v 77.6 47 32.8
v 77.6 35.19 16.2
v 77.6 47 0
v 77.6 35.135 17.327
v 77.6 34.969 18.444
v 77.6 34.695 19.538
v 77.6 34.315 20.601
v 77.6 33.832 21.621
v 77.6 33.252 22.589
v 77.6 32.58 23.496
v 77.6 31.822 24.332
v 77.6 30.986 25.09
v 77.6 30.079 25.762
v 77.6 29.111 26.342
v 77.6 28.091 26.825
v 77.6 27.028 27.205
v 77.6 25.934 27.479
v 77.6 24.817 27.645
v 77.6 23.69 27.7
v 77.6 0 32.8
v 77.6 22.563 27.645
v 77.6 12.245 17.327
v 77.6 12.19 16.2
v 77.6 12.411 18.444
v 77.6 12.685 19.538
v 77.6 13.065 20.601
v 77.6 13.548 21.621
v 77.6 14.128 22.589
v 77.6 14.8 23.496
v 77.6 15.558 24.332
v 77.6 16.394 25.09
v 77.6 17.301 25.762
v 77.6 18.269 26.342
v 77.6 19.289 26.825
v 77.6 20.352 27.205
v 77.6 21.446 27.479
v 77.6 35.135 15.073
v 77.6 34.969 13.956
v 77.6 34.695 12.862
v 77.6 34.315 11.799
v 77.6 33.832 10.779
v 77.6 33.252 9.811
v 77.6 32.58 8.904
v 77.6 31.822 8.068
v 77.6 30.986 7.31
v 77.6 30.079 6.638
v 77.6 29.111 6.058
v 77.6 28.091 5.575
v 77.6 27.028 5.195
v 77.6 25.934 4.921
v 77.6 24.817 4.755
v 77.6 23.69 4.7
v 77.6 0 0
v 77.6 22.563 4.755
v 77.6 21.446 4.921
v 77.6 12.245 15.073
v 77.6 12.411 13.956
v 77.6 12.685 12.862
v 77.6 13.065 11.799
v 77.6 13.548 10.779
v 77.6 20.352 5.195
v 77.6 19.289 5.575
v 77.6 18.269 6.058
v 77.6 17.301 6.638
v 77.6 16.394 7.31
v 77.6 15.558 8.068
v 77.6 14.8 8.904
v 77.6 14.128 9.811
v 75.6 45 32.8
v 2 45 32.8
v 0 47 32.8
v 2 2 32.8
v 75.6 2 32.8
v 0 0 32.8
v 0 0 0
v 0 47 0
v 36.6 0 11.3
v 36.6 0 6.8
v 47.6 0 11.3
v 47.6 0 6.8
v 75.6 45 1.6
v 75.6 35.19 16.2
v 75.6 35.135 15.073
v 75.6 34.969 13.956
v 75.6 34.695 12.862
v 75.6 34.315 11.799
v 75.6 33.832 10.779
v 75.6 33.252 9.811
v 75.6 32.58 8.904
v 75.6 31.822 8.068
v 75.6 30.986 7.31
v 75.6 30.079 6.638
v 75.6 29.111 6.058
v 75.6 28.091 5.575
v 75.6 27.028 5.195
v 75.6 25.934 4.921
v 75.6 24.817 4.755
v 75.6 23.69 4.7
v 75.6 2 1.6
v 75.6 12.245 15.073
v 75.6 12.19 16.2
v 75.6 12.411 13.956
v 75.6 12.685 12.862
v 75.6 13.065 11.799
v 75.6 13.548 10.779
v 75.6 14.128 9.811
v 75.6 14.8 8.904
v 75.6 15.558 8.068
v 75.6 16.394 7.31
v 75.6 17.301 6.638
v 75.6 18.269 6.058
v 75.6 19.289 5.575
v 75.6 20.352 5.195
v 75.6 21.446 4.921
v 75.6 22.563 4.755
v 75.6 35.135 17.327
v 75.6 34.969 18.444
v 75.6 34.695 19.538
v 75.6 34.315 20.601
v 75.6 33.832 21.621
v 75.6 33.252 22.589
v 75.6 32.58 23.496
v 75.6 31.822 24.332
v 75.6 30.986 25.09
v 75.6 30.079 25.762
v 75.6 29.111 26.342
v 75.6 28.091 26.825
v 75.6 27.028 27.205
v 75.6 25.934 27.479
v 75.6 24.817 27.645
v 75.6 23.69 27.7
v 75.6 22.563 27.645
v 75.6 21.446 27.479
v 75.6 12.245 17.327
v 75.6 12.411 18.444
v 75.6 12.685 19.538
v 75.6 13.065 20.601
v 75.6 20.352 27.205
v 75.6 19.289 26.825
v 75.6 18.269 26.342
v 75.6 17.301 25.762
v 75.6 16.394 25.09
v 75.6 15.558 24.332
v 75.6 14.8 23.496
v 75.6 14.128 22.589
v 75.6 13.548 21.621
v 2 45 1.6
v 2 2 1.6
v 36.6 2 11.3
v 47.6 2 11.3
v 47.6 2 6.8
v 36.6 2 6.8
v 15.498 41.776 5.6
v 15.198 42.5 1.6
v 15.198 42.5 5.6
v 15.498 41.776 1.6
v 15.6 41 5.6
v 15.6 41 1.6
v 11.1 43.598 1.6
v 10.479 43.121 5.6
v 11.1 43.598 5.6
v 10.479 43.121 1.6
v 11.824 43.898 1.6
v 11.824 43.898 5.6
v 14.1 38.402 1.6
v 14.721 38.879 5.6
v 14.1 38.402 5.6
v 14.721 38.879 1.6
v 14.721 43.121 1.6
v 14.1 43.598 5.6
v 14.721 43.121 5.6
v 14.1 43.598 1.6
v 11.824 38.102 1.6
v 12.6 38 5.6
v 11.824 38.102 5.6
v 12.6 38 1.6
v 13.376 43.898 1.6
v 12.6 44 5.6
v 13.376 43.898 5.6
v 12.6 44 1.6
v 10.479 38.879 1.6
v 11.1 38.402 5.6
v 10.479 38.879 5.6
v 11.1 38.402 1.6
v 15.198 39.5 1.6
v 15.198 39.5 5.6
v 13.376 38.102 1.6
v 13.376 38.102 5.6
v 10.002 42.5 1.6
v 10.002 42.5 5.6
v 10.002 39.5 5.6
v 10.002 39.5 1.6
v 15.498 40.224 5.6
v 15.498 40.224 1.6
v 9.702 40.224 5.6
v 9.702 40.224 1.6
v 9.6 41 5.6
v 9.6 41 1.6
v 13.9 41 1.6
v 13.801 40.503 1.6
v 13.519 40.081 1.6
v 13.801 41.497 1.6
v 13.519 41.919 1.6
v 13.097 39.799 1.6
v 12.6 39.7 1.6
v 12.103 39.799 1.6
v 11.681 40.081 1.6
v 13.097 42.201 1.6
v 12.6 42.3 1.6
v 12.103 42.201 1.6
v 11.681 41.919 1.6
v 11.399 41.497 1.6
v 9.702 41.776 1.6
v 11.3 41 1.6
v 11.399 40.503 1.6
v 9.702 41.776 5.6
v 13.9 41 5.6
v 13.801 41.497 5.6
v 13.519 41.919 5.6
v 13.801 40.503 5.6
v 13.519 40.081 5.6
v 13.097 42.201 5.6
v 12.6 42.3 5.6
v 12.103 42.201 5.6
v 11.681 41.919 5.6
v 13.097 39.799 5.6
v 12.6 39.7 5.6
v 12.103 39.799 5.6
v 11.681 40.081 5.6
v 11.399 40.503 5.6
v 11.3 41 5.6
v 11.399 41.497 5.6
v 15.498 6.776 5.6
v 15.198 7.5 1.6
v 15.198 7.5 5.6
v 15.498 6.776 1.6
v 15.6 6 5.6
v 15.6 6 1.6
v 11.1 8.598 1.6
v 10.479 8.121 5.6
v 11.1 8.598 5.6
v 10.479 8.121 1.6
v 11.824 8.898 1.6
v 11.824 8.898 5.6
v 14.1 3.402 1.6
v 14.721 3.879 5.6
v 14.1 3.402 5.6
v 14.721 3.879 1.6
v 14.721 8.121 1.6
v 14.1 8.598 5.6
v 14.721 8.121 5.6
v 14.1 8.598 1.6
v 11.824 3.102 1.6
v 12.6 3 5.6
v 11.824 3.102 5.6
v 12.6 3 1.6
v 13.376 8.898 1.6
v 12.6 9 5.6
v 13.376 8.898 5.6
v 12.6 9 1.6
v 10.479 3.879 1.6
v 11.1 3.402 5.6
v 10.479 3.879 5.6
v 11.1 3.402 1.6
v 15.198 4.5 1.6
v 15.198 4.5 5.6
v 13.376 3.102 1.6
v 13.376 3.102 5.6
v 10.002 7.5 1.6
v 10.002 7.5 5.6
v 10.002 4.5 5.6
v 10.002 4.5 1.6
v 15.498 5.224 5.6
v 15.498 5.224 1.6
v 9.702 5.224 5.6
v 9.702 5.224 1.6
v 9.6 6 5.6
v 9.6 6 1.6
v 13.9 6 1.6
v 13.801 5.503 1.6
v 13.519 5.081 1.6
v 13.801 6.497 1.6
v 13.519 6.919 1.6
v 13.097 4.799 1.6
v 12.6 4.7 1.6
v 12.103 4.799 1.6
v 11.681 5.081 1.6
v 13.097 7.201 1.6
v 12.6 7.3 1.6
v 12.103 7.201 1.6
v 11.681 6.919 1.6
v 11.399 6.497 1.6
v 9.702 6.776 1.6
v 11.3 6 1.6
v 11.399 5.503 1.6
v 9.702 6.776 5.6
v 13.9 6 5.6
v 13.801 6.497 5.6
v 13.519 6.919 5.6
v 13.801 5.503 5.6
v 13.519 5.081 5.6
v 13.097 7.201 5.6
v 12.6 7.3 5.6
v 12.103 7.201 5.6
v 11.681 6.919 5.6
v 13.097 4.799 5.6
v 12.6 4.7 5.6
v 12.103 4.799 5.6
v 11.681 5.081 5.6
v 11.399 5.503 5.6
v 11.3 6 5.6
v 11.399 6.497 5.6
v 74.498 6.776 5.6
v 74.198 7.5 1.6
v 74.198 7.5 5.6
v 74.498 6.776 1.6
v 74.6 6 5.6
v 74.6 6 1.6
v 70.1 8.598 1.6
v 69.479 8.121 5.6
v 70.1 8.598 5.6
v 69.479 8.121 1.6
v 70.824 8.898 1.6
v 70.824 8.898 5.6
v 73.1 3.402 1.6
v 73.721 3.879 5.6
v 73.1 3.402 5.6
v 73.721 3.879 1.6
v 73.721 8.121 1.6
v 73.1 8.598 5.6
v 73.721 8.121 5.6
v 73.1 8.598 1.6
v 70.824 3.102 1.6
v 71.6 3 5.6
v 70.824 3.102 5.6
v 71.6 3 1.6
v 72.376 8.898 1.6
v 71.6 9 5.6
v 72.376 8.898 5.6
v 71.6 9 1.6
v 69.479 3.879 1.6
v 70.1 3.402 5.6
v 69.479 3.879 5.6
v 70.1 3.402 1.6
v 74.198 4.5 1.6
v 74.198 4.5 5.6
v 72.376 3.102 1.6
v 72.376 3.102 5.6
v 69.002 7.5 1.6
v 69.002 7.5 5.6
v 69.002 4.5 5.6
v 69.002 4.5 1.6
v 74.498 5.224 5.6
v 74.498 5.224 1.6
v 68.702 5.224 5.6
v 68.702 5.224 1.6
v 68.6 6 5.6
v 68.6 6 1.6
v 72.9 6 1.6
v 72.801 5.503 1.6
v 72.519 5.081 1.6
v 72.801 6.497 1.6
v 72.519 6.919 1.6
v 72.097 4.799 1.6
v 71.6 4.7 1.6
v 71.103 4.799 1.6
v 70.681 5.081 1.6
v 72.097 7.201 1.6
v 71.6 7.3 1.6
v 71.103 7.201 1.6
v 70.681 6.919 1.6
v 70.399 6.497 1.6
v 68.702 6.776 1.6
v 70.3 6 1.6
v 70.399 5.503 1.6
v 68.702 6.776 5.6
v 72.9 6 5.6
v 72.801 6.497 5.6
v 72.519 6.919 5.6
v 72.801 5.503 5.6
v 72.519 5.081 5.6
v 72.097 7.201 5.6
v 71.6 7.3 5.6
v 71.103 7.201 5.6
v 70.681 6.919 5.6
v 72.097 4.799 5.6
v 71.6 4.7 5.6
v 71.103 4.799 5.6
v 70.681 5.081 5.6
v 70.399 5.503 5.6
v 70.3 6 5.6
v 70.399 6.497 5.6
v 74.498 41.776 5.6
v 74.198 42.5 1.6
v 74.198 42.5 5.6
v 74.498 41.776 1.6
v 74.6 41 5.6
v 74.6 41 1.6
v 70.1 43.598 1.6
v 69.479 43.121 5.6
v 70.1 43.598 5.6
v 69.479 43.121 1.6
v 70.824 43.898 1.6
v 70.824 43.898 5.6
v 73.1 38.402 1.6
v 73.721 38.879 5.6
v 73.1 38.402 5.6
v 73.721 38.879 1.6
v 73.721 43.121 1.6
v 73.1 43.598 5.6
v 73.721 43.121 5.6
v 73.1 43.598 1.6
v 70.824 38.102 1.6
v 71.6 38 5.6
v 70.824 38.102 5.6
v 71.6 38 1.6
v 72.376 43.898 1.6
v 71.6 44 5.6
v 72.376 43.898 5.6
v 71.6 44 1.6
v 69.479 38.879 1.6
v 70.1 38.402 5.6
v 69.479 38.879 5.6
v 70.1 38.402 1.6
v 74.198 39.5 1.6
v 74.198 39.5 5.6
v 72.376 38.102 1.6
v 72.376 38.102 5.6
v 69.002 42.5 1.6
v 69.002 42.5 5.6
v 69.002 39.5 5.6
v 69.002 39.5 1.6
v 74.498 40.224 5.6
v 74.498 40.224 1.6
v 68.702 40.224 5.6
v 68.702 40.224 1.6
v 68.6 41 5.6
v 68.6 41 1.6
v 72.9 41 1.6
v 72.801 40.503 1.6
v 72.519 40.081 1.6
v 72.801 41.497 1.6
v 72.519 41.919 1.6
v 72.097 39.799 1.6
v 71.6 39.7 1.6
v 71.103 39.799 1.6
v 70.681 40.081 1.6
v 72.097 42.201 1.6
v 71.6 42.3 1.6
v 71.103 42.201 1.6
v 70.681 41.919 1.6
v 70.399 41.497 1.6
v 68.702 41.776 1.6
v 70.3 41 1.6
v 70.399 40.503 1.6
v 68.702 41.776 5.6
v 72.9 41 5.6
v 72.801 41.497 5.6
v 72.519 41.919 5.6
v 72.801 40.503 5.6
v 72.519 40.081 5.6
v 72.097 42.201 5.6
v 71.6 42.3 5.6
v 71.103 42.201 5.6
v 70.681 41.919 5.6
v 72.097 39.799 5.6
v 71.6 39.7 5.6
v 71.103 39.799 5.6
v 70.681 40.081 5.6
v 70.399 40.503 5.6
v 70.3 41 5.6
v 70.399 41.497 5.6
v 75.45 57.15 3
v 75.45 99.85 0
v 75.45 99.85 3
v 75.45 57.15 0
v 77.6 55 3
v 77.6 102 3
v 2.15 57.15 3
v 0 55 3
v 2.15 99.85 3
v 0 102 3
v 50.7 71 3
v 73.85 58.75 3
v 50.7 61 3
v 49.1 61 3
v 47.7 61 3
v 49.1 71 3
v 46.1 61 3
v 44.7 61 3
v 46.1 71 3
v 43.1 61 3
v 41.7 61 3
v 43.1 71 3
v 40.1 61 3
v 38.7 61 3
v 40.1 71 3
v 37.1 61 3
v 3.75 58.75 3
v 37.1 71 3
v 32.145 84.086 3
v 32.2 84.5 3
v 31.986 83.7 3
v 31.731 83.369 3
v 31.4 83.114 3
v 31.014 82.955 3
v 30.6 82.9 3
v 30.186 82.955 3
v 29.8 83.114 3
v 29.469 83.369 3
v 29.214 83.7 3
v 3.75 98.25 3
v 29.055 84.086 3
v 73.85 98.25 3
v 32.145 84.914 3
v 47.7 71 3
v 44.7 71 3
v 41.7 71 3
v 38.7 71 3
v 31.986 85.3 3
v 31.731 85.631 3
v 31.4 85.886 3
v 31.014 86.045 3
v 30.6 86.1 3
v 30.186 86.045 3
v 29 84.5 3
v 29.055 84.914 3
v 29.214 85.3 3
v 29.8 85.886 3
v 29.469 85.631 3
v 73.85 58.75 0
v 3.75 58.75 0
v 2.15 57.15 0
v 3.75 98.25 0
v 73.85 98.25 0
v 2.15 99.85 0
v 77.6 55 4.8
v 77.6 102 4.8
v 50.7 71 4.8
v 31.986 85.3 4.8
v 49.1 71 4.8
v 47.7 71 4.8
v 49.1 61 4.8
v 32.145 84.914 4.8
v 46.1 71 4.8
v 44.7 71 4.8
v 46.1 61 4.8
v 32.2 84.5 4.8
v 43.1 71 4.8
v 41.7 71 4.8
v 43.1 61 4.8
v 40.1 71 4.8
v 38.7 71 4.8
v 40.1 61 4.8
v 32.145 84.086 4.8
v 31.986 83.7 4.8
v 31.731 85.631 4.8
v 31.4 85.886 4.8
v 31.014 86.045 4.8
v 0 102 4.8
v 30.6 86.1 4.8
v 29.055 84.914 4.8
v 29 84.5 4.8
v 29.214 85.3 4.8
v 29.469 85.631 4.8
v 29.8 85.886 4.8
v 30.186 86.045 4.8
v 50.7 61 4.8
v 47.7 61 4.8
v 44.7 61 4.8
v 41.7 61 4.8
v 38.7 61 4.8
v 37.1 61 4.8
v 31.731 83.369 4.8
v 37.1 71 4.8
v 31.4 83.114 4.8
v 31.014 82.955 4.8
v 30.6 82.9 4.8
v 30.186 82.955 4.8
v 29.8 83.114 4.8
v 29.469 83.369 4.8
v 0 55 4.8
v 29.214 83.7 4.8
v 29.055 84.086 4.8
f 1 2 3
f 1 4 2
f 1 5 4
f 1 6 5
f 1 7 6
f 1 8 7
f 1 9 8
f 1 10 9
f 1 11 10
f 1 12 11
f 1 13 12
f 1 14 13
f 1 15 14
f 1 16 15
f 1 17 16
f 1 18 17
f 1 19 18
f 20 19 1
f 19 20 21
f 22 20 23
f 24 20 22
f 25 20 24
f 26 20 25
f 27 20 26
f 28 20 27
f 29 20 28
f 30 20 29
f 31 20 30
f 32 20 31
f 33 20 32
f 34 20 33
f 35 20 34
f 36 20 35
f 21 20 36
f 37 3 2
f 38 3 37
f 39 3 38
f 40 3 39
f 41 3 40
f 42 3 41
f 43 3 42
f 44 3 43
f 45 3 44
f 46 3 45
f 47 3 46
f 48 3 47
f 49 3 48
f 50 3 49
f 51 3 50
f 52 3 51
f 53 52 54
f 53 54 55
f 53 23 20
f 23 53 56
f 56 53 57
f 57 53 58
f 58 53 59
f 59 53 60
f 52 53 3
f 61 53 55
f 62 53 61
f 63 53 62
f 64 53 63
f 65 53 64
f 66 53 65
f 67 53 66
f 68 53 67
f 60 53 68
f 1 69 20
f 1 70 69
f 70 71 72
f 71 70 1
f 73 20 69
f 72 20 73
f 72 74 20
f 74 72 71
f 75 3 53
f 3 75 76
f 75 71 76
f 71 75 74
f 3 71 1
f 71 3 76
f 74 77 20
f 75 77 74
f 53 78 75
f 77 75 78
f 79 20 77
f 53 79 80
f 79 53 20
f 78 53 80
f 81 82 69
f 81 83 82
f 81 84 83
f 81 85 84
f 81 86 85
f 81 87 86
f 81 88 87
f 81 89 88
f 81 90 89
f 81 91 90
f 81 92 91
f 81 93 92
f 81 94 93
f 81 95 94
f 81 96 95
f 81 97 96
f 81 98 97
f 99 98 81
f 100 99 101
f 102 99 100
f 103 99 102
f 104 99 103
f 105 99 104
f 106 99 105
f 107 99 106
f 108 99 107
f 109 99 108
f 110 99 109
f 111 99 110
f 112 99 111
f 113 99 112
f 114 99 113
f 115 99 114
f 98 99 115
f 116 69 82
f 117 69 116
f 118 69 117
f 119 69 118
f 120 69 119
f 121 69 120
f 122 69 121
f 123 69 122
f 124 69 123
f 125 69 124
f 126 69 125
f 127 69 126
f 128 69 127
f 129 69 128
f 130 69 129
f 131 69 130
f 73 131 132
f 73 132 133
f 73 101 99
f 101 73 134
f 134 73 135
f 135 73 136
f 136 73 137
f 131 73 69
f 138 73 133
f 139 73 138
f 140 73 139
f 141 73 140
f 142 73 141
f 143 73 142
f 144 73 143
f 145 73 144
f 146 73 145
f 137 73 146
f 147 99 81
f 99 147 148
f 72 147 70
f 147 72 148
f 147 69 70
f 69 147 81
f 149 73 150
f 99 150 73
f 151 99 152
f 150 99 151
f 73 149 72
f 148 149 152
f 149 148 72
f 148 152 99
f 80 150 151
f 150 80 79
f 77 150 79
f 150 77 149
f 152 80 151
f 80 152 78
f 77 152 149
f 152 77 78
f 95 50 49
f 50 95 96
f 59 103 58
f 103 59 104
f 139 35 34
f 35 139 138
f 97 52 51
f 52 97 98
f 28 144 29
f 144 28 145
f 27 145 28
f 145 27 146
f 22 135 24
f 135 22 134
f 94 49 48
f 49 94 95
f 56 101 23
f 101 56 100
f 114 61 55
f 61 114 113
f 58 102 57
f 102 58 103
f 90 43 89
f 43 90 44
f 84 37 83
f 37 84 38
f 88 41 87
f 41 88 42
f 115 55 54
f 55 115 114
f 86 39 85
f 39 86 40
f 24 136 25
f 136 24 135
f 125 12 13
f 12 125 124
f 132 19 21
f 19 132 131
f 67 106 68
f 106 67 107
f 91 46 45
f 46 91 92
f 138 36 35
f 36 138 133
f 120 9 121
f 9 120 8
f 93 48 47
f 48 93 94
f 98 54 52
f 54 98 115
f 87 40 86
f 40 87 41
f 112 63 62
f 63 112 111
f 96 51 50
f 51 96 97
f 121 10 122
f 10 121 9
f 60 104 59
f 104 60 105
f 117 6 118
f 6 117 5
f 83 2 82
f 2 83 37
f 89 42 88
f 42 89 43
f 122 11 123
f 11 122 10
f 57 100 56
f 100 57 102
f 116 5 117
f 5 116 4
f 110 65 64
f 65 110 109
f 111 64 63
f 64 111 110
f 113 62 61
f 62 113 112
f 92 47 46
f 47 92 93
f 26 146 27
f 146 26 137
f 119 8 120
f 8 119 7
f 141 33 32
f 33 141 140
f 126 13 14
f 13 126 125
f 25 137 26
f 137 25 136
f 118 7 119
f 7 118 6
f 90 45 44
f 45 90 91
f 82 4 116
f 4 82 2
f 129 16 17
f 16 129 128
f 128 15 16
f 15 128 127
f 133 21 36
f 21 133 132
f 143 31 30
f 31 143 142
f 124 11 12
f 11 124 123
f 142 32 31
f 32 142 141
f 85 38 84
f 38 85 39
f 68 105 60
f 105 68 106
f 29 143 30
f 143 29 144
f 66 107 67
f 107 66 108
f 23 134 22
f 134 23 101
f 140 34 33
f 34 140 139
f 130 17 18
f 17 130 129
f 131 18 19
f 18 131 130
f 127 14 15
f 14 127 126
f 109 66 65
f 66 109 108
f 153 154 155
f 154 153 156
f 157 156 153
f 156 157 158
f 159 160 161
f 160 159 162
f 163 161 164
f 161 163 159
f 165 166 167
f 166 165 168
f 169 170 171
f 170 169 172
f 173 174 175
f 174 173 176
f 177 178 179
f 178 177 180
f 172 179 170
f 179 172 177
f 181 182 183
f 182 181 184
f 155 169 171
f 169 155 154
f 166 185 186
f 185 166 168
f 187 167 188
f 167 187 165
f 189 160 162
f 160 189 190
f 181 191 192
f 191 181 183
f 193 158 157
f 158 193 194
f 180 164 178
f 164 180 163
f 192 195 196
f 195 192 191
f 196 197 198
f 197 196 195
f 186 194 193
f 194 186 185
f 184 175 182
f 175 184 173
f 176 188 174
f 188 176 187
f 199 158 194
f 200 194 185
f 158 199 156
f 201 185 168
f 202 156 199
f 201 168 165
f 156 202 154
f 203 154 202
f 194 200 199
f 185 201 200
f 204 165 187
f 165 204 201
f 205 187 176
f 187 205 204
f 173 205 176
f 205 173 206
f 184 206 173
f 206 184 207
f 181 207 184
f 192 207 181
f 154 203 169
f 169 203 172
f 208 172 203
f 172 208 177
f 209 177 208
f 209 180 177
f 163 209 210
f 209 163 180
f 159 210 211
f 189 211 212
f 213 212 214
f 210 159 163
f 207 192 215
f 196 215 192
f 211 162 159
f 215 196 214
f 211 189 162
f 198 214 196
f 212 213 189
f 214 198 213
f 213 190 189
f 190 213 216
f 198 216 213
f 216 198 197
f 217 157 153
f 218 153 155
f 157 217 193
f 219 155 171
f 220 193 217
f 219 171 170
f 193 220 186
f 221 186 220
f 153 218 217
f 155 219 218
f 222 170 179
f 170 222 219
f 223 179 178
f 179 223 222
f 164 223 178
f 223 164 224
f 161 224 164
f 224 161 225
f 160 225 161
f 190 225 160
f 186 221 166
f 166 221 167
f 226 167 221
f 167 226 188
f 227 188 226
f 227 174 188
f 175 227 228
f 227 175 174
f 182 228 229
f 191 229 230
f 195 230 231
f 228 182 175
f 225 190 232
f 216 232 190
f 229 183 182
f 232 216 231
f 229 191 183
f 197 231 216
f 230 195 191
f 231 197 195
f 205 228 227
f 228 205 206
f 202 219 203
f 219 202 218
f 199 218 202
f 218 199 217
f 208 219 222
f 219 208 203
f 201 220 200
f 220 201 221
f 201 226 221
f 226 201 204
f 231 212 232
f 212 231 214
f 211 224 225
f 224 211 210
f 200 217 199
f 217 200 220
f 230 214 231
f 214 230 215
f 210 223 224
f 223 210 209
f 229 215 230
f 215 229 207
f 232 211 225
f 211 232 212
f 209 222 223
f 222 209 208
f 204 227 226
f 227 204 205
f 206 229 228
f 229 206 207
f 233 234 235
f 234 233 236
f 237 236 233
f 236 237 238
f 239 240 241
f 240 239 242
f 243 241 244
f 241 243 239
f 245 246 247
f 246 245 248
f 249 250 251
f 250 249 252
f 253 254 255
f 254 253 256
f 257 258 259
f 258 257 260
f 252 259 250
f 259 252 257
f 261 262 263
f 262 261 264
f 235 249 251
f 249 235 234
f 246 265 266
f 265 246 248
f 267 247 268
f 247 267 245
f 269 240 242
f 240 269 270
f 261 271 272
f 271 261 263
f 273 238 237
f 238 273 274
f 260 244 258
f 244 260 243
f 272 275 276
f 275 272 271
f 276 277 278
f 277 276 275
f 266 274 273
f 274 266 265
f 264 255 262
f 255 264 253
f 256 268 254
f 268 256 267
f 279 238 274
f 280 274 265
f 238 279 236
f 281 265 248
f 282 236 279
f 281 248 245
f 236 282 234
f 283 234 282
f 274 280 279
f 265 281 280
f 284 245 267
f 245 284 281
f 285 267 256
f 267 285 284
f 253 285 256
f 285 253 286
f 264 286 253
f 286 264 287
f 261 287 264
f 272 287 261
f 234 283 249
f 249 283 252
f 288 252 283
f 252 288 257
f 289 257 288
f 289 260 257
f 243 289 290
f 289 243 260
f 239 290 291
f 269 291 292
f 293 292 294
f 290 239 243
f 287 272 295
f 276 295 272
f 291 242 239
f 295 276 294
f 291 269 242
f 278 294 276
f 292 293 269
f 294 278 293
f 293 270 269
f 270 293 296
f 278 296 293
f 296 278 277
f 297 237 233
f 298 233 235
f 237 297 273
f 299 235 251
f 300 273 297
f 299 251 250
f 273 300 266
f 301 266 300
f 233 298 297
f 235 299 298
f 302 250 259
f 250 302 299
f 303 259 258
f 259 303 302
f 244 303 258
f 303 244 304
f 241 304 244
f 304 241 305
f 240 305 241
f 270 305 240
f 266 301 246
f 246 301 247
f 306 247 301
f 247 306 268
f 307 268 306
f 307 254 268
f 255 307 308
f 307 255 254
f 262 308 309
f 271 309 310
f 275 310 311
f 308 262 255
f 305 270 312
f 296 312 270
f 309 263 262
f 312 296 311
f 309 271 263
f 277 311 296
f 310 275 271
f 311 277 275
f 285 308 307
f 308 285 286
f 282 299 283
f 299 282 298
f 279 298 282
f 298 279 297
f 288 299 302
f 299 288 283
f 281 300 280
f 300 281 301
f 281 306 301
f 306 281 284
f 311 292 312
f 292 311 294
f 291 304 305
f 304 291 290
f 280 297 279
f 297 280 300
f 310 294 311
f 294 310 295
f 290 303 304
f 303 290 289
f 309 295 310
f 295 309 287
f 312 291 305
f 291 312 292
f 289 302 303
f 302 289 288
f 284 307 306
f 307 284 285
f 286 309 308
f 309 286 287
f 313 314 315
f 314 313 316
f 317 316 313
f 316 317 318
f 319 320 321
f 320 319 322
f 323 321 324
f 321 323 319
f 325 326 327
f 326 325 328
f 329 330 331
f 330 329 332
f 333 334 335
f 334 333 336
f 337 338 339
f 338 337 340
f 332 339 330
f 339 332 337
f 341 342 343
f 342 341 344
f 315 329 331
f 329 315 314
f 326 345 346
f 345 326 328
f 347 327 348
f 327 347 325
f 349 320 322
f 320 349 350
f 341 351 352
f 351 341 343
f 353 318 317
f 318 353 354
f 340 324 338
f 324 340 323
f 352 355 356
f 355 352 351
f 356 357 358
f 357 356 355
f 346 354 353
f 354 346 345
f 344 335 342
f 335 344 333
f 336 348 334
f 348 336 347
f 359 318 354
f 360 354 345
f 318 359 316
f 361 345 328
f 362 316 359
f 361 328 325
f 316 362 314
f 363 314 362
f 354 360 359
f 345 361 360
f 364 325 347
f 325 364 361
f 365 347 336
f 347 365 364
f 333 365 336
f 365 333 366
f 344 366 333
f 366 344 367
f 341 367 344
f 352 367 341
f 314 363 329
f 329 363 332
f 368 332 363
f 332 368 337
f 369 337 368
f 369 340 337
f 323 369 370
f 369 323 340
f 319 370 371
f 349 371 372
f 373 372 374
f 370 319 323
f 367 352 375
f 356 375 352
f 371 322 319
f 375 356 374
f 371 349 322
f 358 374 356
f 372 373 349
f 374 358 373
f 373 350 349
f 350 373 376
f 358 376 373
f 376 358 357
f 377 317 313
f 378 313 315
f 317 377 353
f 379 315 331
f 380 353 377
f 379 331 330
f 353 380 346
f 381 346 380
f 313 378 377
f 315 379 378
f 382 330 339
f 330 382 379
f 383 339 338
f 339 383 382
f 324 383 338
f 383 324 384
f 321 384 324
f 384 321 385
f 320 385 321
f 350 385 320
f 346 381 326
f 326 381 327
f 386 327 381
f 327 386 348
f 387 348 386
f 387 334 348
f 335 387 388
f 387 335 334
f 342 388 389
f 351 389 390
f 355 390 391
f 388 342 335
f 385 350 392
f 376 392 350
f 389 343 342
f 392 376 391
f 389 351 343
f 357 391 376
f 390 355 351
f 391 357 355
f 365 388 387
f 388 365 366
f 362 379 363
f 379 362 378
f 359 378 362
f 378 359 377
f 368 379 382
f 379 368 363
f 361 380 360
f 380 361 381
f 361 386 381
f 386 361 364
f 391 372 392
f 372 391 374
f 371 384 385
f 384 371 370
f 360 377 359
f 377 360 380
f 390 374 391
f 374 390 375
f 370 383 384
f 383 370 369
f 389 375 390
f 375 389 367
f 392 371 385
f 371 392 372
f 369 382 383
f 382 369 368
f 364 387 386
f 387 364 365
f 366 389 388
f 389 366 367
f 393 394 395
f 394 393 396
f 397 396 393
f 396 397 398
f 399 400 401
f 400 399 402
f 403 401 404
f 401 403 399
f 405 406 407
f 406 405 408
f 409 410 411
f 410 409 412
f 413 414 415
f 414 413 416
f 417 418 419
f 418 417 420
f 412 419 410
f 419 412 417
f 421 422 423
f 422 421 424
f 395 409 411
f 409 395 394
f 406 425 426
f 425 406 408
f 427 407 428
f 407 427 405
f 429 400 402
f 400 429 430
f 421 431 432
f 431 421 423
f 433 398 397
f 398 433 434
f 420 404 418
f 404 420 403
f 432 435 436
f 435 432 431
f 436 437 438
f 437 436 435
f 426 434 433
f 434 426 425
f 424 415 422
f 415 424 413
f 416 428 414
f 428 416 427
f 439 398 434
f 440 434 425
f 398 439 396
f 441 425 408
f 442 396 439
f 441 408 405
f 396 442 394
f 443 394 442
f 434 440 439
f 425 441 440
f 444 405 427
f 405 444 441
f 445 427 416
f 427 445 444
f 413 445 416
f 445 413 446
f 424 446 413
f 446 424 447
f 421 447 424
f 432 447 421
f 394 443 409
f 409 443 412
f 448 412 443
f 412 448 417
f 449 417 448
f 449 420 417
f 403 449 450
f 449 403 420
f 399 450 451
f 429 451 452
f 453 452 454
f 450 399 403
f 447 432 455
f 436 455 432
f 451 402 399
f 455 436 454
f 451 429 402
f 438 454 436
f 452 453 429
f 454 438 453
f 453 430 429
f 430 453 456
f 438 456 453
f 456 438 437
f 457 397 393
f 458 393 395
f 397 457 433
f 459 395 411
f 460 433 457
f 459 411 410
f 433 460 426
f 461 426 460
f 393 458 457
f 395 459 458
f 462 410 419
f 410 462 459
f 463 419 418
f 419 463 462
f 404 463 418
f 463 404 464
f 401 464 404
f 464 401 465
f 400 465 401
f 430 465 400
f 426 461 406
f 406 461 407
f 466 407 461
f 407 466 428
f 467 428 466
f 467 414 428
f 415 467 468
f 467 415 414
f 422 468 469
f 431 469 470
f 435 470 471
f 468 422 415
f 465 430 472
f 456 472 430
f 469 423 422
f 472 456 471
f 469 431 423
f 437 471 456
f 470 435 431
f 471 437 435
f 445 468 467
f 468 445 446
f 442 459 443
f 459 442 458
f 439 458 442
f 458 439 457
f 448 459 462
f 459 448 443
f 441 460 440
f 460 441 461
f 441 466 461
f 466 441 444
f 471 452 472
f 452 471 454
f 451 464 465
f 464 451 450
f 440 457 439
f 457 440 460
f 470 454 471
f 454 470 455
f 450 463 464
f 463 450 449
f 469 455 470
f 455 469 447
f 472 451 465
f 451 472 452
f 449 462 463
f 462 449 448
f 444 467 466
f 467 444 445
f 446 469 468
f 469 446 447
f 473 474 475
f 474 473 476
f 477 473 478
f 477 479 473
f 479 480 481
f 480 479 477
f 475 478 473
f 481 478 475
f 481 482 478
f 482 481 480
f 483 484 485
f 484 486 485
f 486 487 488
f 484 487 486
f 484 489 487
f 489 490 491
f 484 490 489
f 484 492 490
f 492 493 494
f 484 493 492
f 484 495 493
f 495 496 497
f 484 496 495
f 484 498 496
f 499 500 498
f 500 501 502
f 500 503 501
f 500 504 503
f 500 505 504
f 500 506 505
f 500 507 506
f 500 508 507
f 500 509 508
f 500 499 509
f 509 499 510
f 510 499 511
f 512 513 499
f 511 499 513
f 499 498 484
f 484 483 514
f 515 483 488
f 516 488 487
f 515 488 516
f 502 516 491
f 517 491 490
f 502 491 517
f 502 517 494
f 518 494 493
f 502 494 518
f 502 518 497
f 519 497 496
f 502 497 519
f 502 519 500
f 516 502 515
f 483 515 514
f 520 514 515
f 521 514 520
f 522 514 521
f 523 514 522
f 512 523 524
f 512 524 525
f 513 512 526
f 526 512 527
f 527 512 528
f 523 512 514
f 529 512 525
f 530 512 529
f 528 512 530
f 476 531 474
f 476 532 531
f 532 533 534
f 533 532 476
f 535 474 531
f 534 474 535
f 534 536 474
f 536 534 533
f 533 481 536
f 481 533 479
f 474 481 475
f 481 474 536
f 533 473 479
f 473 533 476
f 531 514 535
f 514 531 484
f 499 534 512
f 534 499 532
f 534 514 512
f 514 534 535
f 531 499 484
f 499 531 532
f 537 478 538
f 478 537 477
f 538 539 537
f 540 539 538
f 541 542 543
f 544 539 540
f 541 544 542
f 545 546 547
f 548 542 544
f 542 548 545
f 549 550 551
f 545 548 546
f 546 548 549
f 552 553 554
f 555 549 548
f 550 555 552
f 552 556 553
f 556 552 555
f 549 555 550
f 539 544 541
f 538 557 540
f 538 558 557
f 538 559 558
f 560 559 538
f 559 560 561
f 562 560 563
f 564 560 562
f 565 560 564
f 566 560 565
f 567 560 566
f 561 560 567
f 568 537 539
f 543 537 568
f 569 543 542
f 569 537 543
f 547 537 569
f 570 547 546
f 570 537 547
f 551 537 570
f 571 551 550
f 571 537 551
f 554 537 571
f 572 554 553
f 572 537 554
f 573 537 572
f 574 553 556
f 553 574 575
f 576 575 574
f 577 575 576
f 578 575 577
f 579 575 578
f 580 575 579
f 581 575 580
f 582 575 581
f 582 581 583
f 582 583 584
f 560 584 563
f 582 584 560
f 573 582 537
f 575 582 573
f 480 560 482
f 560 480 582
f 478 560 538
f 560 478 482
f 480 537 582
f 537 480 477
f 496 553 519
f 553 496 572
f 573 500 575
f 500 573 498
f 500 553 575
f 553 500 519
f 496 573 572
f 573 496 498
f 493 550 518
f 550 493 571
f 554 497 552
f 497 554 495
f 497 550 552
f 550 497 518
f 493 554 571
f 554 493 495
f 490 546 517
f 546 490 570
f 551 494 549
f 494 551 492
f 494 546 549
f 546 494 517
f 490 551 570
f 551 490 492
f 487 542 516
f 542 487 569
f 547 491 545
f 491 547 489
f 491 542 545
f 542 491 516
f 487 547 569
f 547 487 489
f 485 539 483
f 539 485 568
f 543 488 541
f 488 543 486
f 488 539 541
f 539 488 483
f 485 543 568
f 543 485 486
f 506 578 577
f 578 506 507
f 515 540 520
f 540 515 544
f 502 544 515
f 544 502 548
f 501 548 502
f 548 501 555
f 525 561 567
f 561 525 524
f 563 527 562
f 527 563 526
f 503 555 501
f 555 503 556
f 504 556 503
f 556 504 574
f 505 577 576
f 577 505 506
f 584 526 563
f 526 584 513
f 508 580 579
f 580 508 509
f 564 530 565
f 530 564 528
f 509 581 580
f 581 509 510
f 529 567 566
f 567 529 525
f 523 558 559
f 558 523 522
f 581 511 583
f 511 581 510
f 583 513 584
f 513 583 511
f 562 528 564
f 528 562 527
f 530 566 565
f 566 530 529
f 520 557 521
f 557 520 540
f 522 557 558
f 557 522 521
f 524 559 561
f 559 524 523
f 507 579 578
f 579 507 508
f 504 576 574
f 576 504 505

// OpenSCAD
// WakeLight v1.1 enclosure — two-part snap-lid box for the custom PCB.
// Print: PETG or PLA, 0.2 mm layers, no supports. Lid prints upside-down.
//
// Board: 66 x 42 mm, M3 holes at (3.5,3.5)(3.5,38.5)(62.5,38.5)(62.5,3.5)
// ESP32 antenna overhangs the board's left edge by 6.4 mm (keep plastic
// thin there, no metal). USB-C on the bottom edge. Neutrik NC5FAH XLR on
// the right edge — its nose pokes through a large opening in the right wall.

wall   = 2.0;
floor_t = 1.6;
pcb_w  = 66;     // x
pcb_h  = 42;     // y
pcb_t  = 1.6;
ant_overhang = 6.6;
standoff_h = 4;          // space under board for THT pins
// XLR front flange is 25.3 sq centred on the mating axis 9 mm above the
// board -> flange top reaches 21.7 mm above the PCB; leave lid-lip room.
inner_clear_h = 24;
lid_t = 1.8;

// NC5FAH mating axis, in board coordinates (verified from Neutrik drawing):
// centreline through pins 2/3 at board y = 20.81, axis 9.0 mm above PCB top.
xlr_y_board = 20.81;
xlr_axis_z  = 9.0;
xlr_hole_d  = 23.0;      // panel cut-out: Neutrik says min dia 22

iw = pcb_w + ant_overhang + 1.0;   // inner cavity (extra for antenna)
ih = pcb_h + 1.0;
oh = floor_t + standoff_h + pcb_t + inner_clear_h;

holes = [[3.5,3.5],[3.5,38.5],[62.5,38.5],[62.5,3.5]];
// PCB origin inside cavity: antenna side gets the extra room
pcb_x0 = ant_overhang + 0.5;
pcb_y0 = 0.5;

module box() {
  difference() {
    // shell
    cube([iw + 2*wall, ih + 2*wall, oh + floor_t]);
    // cavity
    translate([wall, wall, floor_t])
      cube([iw, ih, oh + 1]);
    // USB-C cutout: board "bottom" edge (y=42 side) faces the front wall.
    // Connector centre at board x=33 → cavity x = pcb_x0+33, sits on top of
    // the board: z = floor_t+standoff_h+pcb_t .. +3.5
    translate([wall + pcb_x0 + 33 - 5.5, 0, floor_t + standoff_h + pcb_t - 0.4])
      cube([11, wall + 2, 4.5]);
    // XLR aperture: round hole through the right wall, centred on the
    // connector's mating axis. The 25.3 sq front flange presses against the
    // inside face of this wall (the wall acts as the "front panel"); only
    // the round latch nose (2.7 mm) protrudes through.
    translate([wall + iw - 1,
               wall + pcb_y0 + (pcb_h - xlr_y_board),
               floor_t + standoff_h + pcb_t + xlr_axis_z])
      rotate([0, 90, 0])
        cylinder(d = xlr_hole_d, h = wall + 2, $fn = 64);
    // status LED light pipe hole (board 21.5, 15 → top handled by lid)
  }
  // PCB standoffs with M3 pilot holes
  for (h = holes)
    translate([wall + pcb_x0 + h[0], wall + pcb_y0 + (pcb_h - h[1]), floor_t])
      difference() {
        cylinder(d = 6, h = standoff_h, $fn = 24);
        cylinder(d = 2.6, h = standoff_h + 1, $fn = 16);
      }
}

module lid() {
  difference() {
    union() {
      cube([iw + 2*wall, ih + 2*wall, lid_t]);
      // friction lip
      translate([wall + 0.15, wall + 0.15, -3])
        difference() {
          cube([iw - 0.3, ih - 0.3, 3]);
          translate([1.6, 1.6, -1]) cube([iw - 3.5, ih - 3.5, 5]);
        }
    }
    // vent slots over the mid-board area (clear of the XLR body) + LED hole
    for (i = [0:4])
      translate([wall + pcb_x0 + 28 + i*3, wall + 4, -1]) cube([1.6, 10, lid_t + 2]);
    translate([wall + pcb_x0 + 21.5, wall + pcb_y0 + (pcb_h - 15), -1])
      cylinder(d = 3.2, h = lid_t + 2, $fn = 24);   // blue LED shows through
  }
}

box();
translate([0, ih + 2*wall + 8, 3]) lid();
